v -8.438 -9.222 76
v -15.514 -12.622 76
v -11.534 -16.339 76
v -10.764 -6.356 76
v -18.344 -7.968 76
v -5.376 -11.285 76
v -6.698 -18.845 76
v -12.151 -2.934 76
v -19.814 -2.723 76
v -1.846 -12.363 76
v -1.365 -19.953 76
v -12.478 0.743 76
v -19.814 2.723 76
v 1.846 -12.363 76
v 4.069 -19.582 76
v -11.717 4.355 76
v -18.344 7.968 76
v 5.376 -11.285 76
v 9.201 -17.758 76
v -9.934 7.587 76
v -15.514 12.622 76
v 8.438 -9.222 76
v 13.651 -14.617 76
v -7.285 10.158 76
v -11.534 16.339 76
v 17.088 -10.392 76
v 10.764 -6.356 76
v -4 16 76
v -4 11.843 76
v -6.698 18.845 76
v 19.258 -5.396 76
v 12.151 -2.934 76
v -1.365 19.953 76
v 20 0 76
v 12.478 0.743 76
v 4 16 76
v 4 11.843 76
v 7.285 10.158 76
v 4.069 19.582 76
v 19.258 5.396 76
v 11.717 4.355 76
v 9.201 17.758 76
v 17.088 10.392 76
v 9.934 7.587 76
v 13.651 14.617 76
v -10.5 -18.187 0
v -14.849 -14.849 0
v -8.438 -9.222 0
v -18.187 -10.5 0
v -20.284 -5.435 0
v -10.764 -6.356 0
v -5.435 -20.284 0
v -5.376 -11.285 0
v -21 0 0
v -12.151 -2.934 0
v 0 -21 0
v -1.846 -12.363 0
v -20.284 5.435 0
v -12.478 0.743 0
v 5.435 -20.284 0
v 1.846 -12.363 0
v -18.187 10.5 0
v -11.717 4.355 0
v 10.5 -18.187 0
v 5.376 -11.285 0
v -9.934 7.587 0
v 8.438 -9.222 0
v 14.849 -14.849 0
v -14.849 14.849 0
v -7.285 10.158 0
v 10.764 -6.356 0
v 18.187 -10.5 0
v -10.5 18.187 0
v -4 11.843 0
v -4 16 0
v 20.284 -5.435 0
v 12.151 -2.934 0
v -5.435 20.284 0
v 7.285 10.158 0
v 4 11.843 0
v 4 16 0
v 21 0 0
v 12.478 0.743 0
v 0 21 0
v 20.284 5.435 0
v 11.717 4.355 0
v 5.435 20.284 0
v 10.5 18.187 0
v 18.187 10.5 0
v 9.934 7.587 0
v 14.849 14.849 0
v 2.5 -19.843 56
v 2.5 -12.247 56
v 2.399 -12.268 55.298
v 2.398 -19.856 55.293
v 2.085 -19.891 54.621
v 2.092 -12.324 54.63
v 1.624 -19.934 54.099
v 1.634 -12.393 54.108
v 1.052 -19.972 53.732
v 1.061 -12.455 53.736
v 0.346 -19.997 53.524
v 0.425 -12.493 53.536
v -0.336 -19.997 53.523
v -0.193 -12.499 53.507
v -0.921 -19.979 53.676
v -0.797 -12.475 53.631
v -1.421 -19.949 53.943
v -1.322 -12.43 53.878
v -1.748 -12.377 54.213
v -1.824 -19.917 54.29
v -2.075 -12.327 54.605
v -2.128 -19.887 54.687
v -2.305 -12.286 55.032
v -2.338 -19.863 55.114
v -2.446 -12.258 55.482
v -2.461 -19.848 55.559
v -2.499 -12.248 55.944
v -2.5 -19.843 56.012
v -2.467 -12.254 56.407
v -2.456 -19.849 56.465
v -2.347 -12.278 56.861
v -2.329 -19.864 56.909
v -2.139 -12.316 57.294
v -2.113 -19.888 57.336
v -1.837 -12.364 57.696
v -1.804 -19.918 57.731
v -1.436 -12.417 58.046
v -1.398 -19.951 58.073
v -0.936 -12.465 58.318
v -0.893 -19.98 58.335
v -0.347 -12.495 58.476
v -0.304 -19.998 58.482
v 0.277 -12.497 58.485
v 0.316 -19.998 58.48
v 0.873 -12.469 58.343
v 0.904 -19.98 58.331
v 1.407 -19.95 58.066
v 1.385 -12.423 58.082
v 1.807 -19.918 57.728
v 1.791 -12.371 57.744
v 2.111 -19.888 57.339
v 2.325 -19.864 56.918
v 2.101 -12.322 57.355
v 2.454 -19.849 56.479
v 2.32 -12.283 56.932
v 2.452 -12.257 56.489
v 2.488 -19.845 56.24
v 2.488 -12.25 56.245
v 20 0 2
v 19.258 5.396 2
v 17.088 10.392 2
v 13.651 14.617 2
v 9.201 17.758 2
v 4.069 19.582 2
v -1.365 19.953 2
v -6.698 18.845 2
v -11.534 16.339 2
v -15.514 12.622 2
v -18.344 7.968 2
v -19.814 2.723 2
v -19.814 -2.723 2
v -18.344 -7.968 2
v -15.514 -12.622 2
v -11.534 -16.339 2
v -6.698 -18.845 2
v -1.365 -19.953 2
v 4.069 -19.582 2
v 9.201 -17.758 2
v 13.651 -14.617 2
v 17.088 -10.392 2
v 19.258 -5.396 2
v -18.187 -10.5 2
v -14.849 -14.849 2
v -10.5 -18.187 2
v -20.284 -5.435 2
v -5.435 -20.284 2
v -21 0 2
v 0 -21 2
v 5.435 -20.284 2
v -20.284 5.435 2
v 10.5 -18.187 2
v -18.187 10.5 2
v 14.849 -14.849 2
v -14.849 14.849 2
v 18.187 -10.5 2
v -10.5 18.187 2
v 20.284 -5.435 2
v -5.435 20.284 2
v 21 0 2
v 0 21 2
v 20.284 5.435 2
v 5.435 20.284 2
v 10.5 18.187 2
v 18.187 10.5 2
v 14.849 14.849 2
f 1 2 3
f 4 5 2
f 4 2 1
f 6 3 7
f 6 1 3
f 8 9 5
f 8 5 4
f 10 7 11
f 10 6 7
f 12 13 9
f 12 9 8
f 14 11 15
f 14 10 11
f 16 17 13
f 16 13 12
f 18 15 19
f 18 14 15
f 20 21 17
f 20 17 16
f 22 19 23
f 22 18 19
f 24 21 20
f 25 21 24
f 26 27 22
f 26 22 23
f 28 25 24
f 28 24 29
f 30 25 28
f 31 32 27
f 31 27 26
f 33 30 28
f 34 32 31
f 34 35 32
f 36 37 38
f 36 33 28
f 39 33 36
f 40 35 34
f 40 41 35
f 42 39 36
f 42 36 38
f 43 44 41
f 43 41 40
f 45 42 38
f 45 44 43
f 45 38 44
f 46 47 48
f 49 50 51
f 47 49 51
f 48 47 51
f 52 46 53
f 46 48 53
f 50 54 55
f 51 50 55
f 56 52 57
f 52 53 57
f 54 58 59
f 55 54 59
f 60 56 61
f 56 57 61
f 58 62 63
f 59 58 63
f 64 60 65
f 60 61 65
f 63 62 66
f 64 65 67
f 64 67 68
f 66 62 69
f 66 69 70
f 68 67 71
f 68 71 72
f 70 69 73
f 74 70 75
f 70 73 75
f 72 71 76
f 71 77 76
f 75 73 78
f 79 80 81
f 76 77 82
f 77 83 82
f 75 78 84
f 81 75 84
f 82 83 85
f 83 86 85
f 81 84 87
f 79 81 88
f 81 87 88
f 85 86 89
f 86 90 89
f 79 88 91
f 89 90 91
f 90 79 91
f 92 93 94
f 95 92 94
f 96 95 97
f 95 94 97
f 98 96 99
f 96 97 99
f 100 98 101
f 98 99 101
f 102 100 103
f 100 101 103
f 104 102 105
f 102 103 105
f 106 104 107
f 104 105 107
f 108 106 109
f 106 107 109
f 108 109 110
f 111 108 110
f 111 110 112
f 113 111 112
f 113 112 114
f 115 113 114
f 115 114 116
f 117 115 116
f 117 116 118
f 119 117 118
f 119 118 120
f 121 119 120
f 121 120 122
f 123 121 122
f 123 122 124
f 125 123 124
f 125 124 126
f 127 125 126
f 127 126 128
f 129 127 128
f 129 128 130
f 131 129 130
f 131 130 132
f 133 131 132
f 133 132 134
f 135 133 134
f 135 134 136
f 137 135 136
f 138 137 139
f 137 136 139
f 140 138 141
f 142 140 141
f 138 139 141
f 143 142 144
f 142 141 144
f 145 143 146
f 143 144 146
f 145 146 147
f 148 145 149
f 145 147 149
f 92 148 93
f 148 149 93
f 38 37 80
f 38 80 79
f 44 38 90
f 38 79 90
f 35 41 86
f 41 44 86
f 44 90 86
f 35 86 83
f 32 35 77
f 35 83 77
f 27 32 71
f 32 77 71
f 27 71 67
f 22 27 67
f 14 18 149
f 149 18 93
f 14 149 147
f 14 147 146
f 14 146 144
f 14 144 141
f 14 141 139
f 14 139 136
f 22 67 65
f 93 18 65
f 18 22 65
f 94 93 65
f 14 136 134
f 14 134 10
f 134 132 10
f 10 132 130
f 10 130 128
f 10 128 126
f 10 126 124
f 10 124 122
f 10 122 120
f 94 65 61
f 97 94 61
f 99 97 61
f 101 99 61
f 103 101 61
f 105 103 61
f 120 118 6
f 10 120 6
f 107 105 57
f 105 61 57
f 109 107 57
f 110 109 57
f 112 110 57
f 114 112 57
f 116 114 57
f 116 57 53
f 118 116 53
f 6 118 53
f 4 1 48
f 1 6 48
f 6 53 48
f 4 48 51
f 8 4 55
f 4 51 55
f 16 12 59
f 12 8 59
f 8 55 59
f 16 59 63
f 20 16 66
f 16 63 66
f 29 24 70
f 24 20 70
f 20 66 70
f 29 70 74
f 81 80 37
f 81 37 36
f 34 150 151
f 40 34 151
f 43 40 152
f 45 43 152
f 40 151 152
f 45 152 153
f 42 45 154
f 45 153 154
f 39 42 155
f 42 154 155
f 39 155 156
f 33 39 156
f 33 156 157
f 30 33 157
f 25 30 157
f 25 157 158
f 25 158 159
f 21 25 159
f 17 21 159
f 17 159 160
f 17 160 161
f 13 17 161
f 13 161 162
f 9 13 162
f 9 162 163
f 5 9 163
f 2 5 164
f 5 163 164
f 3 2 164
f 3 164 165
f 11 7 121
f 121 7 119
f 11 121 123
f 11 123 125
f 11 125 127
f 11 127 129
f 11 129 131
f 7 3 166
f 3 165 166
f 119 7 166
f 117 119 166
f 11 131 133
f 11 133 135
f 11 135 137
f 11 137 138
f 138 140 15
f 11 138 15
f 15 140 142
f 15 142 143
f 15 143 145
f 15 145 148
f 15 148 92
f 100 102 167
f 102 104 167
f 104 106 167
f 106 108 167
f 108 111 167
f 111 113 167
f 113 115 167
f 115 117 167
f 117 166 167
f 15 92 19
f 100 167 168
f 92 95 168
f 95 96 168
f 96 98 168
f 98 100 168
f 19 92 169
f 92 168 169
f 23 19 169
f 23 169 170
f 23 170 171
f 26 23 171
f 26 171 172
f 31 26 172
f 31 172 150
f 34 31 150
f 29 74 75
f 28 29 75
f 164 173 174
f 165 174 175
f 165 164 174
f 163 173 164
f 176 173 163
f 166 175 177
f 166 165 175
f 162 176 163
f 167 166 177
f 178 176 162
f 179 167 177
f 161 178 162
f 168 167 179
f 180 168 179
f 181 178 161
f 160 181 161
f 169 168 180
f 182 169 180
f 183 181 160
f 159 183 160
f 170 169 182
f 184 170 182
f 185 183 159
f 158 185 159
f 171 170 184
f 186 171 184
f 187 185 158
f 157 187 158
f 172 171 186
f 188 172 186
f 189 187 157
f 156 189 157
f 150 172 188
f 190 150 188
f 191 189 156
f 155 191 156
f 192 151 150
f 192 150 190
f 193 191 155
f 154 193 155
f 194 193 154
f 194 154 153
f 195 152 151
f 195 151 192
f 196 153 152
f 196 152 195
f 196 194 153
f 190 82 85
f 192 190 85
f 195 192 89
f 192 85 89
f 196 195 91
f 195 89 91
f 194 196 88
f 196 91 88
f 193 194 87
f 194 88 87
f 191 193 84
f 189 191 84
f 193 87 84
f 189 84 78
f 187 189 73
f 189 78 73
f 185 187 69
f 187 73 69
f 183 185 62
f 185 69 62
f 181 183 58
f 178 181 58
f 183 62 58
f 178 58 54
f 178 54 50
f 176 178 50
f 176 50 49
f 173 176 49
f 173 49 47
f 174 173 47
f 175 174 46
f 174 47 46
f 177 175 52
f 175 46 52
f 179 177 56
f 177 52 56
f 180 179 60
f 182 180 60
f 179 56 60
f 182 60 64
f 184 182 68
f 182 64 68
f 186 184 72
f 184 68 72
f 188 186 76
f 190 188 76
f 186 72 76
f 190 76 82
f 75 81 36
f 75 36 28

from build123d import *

# Parameters (mm, degrees)
SKETCH1_R                 = 21
BOSS_EXTRUDE1_DEPTH       = 2
SKETCH2_R                 = 20
BOSS_EXTRUDE2_DEPTH       = 74
SKETCH3_R                 = 12.5
CUT_EXTRUDE1_DEPTH        = 77
SKETCH4_W                 = 8
SKETCH4_H                 = 7
CUT_EXTRUDE2_DEPTH        = 76
M6X1_0_TAPPED_HOLE1_D     = 5
M6X1_0_TAPPED_HOLE1_DEPTH = 8.497848452
M6X1_0_TAPPED_HOLE1_TIP   = 1.502151548


with BuildPart() as part:
    # Sketch1 → Boss-Extrude1 (new body)
    with BuildSketch(Plane.XY):
        Circle(SKETCH1_R)
    extrude(amount=BOSS_EXTRUDE1_DEPTH)

    # Sketch2 → Boss-Extrude2 (add)
    with BuildSketch(Plane.XY.offset(2)):
        Circle(SKETCH2_R)
    extrude(amount=BOSS_EXTRUDE2_DEPTH)

    # Sketch3 → Cut-Extrude1 (cut, through all)
    with BuildSketch(Plane(origin=(0, 0, 0), x_dir=(-1, 0, 0), z_dir=(0, 0, -1))):
        Circle(SKETCH3_R)
    extrude(amount=-CUT_EXTRUDE1_DEPTH, mode=Mode.SUBTRACT)

    # Sketch4 → Cut-Extrude2 (cut)
    with BuildSketch(Plane(origin=(0, 0, 0), x_dir=(-1, 0, 0), z_dir=(0, 0, -1))):
        with Locations((0, 12.5)):
            Rectangle(SKETCH4_W, SKETCH4_H)
    extrude(amount=-CUT_EXTRUDE2_DEPTH, mode=Mode.SUBTRACT)

    # M6x1.0 Tapped Hole1
    with Locations(Plane(origin=(0, -20, 0), x_dir=(-1, 0, 0), z_dir=(0, -1, 0))):
        with Locations((0, -56)):
            Hole(M6X1_0_TAPPED_HOLE1_D / 2, depth=M6X1_0_TAPPED_HOLE1_DEPTH)
            with Locations((0, 0, -(M6X1_0_TAPPED_HOLE1_DEPTH + M6X1_0_TAPPED_HOLE1_TIP / 2))):  # 118° drill point
                Cone(0, M6X1_0_TAPPED_HOLE1_D / 2, M6X1_0_TAPPED_HOLE1_TIP, mode=Mode.SUBTRACT)


solid = part.part
